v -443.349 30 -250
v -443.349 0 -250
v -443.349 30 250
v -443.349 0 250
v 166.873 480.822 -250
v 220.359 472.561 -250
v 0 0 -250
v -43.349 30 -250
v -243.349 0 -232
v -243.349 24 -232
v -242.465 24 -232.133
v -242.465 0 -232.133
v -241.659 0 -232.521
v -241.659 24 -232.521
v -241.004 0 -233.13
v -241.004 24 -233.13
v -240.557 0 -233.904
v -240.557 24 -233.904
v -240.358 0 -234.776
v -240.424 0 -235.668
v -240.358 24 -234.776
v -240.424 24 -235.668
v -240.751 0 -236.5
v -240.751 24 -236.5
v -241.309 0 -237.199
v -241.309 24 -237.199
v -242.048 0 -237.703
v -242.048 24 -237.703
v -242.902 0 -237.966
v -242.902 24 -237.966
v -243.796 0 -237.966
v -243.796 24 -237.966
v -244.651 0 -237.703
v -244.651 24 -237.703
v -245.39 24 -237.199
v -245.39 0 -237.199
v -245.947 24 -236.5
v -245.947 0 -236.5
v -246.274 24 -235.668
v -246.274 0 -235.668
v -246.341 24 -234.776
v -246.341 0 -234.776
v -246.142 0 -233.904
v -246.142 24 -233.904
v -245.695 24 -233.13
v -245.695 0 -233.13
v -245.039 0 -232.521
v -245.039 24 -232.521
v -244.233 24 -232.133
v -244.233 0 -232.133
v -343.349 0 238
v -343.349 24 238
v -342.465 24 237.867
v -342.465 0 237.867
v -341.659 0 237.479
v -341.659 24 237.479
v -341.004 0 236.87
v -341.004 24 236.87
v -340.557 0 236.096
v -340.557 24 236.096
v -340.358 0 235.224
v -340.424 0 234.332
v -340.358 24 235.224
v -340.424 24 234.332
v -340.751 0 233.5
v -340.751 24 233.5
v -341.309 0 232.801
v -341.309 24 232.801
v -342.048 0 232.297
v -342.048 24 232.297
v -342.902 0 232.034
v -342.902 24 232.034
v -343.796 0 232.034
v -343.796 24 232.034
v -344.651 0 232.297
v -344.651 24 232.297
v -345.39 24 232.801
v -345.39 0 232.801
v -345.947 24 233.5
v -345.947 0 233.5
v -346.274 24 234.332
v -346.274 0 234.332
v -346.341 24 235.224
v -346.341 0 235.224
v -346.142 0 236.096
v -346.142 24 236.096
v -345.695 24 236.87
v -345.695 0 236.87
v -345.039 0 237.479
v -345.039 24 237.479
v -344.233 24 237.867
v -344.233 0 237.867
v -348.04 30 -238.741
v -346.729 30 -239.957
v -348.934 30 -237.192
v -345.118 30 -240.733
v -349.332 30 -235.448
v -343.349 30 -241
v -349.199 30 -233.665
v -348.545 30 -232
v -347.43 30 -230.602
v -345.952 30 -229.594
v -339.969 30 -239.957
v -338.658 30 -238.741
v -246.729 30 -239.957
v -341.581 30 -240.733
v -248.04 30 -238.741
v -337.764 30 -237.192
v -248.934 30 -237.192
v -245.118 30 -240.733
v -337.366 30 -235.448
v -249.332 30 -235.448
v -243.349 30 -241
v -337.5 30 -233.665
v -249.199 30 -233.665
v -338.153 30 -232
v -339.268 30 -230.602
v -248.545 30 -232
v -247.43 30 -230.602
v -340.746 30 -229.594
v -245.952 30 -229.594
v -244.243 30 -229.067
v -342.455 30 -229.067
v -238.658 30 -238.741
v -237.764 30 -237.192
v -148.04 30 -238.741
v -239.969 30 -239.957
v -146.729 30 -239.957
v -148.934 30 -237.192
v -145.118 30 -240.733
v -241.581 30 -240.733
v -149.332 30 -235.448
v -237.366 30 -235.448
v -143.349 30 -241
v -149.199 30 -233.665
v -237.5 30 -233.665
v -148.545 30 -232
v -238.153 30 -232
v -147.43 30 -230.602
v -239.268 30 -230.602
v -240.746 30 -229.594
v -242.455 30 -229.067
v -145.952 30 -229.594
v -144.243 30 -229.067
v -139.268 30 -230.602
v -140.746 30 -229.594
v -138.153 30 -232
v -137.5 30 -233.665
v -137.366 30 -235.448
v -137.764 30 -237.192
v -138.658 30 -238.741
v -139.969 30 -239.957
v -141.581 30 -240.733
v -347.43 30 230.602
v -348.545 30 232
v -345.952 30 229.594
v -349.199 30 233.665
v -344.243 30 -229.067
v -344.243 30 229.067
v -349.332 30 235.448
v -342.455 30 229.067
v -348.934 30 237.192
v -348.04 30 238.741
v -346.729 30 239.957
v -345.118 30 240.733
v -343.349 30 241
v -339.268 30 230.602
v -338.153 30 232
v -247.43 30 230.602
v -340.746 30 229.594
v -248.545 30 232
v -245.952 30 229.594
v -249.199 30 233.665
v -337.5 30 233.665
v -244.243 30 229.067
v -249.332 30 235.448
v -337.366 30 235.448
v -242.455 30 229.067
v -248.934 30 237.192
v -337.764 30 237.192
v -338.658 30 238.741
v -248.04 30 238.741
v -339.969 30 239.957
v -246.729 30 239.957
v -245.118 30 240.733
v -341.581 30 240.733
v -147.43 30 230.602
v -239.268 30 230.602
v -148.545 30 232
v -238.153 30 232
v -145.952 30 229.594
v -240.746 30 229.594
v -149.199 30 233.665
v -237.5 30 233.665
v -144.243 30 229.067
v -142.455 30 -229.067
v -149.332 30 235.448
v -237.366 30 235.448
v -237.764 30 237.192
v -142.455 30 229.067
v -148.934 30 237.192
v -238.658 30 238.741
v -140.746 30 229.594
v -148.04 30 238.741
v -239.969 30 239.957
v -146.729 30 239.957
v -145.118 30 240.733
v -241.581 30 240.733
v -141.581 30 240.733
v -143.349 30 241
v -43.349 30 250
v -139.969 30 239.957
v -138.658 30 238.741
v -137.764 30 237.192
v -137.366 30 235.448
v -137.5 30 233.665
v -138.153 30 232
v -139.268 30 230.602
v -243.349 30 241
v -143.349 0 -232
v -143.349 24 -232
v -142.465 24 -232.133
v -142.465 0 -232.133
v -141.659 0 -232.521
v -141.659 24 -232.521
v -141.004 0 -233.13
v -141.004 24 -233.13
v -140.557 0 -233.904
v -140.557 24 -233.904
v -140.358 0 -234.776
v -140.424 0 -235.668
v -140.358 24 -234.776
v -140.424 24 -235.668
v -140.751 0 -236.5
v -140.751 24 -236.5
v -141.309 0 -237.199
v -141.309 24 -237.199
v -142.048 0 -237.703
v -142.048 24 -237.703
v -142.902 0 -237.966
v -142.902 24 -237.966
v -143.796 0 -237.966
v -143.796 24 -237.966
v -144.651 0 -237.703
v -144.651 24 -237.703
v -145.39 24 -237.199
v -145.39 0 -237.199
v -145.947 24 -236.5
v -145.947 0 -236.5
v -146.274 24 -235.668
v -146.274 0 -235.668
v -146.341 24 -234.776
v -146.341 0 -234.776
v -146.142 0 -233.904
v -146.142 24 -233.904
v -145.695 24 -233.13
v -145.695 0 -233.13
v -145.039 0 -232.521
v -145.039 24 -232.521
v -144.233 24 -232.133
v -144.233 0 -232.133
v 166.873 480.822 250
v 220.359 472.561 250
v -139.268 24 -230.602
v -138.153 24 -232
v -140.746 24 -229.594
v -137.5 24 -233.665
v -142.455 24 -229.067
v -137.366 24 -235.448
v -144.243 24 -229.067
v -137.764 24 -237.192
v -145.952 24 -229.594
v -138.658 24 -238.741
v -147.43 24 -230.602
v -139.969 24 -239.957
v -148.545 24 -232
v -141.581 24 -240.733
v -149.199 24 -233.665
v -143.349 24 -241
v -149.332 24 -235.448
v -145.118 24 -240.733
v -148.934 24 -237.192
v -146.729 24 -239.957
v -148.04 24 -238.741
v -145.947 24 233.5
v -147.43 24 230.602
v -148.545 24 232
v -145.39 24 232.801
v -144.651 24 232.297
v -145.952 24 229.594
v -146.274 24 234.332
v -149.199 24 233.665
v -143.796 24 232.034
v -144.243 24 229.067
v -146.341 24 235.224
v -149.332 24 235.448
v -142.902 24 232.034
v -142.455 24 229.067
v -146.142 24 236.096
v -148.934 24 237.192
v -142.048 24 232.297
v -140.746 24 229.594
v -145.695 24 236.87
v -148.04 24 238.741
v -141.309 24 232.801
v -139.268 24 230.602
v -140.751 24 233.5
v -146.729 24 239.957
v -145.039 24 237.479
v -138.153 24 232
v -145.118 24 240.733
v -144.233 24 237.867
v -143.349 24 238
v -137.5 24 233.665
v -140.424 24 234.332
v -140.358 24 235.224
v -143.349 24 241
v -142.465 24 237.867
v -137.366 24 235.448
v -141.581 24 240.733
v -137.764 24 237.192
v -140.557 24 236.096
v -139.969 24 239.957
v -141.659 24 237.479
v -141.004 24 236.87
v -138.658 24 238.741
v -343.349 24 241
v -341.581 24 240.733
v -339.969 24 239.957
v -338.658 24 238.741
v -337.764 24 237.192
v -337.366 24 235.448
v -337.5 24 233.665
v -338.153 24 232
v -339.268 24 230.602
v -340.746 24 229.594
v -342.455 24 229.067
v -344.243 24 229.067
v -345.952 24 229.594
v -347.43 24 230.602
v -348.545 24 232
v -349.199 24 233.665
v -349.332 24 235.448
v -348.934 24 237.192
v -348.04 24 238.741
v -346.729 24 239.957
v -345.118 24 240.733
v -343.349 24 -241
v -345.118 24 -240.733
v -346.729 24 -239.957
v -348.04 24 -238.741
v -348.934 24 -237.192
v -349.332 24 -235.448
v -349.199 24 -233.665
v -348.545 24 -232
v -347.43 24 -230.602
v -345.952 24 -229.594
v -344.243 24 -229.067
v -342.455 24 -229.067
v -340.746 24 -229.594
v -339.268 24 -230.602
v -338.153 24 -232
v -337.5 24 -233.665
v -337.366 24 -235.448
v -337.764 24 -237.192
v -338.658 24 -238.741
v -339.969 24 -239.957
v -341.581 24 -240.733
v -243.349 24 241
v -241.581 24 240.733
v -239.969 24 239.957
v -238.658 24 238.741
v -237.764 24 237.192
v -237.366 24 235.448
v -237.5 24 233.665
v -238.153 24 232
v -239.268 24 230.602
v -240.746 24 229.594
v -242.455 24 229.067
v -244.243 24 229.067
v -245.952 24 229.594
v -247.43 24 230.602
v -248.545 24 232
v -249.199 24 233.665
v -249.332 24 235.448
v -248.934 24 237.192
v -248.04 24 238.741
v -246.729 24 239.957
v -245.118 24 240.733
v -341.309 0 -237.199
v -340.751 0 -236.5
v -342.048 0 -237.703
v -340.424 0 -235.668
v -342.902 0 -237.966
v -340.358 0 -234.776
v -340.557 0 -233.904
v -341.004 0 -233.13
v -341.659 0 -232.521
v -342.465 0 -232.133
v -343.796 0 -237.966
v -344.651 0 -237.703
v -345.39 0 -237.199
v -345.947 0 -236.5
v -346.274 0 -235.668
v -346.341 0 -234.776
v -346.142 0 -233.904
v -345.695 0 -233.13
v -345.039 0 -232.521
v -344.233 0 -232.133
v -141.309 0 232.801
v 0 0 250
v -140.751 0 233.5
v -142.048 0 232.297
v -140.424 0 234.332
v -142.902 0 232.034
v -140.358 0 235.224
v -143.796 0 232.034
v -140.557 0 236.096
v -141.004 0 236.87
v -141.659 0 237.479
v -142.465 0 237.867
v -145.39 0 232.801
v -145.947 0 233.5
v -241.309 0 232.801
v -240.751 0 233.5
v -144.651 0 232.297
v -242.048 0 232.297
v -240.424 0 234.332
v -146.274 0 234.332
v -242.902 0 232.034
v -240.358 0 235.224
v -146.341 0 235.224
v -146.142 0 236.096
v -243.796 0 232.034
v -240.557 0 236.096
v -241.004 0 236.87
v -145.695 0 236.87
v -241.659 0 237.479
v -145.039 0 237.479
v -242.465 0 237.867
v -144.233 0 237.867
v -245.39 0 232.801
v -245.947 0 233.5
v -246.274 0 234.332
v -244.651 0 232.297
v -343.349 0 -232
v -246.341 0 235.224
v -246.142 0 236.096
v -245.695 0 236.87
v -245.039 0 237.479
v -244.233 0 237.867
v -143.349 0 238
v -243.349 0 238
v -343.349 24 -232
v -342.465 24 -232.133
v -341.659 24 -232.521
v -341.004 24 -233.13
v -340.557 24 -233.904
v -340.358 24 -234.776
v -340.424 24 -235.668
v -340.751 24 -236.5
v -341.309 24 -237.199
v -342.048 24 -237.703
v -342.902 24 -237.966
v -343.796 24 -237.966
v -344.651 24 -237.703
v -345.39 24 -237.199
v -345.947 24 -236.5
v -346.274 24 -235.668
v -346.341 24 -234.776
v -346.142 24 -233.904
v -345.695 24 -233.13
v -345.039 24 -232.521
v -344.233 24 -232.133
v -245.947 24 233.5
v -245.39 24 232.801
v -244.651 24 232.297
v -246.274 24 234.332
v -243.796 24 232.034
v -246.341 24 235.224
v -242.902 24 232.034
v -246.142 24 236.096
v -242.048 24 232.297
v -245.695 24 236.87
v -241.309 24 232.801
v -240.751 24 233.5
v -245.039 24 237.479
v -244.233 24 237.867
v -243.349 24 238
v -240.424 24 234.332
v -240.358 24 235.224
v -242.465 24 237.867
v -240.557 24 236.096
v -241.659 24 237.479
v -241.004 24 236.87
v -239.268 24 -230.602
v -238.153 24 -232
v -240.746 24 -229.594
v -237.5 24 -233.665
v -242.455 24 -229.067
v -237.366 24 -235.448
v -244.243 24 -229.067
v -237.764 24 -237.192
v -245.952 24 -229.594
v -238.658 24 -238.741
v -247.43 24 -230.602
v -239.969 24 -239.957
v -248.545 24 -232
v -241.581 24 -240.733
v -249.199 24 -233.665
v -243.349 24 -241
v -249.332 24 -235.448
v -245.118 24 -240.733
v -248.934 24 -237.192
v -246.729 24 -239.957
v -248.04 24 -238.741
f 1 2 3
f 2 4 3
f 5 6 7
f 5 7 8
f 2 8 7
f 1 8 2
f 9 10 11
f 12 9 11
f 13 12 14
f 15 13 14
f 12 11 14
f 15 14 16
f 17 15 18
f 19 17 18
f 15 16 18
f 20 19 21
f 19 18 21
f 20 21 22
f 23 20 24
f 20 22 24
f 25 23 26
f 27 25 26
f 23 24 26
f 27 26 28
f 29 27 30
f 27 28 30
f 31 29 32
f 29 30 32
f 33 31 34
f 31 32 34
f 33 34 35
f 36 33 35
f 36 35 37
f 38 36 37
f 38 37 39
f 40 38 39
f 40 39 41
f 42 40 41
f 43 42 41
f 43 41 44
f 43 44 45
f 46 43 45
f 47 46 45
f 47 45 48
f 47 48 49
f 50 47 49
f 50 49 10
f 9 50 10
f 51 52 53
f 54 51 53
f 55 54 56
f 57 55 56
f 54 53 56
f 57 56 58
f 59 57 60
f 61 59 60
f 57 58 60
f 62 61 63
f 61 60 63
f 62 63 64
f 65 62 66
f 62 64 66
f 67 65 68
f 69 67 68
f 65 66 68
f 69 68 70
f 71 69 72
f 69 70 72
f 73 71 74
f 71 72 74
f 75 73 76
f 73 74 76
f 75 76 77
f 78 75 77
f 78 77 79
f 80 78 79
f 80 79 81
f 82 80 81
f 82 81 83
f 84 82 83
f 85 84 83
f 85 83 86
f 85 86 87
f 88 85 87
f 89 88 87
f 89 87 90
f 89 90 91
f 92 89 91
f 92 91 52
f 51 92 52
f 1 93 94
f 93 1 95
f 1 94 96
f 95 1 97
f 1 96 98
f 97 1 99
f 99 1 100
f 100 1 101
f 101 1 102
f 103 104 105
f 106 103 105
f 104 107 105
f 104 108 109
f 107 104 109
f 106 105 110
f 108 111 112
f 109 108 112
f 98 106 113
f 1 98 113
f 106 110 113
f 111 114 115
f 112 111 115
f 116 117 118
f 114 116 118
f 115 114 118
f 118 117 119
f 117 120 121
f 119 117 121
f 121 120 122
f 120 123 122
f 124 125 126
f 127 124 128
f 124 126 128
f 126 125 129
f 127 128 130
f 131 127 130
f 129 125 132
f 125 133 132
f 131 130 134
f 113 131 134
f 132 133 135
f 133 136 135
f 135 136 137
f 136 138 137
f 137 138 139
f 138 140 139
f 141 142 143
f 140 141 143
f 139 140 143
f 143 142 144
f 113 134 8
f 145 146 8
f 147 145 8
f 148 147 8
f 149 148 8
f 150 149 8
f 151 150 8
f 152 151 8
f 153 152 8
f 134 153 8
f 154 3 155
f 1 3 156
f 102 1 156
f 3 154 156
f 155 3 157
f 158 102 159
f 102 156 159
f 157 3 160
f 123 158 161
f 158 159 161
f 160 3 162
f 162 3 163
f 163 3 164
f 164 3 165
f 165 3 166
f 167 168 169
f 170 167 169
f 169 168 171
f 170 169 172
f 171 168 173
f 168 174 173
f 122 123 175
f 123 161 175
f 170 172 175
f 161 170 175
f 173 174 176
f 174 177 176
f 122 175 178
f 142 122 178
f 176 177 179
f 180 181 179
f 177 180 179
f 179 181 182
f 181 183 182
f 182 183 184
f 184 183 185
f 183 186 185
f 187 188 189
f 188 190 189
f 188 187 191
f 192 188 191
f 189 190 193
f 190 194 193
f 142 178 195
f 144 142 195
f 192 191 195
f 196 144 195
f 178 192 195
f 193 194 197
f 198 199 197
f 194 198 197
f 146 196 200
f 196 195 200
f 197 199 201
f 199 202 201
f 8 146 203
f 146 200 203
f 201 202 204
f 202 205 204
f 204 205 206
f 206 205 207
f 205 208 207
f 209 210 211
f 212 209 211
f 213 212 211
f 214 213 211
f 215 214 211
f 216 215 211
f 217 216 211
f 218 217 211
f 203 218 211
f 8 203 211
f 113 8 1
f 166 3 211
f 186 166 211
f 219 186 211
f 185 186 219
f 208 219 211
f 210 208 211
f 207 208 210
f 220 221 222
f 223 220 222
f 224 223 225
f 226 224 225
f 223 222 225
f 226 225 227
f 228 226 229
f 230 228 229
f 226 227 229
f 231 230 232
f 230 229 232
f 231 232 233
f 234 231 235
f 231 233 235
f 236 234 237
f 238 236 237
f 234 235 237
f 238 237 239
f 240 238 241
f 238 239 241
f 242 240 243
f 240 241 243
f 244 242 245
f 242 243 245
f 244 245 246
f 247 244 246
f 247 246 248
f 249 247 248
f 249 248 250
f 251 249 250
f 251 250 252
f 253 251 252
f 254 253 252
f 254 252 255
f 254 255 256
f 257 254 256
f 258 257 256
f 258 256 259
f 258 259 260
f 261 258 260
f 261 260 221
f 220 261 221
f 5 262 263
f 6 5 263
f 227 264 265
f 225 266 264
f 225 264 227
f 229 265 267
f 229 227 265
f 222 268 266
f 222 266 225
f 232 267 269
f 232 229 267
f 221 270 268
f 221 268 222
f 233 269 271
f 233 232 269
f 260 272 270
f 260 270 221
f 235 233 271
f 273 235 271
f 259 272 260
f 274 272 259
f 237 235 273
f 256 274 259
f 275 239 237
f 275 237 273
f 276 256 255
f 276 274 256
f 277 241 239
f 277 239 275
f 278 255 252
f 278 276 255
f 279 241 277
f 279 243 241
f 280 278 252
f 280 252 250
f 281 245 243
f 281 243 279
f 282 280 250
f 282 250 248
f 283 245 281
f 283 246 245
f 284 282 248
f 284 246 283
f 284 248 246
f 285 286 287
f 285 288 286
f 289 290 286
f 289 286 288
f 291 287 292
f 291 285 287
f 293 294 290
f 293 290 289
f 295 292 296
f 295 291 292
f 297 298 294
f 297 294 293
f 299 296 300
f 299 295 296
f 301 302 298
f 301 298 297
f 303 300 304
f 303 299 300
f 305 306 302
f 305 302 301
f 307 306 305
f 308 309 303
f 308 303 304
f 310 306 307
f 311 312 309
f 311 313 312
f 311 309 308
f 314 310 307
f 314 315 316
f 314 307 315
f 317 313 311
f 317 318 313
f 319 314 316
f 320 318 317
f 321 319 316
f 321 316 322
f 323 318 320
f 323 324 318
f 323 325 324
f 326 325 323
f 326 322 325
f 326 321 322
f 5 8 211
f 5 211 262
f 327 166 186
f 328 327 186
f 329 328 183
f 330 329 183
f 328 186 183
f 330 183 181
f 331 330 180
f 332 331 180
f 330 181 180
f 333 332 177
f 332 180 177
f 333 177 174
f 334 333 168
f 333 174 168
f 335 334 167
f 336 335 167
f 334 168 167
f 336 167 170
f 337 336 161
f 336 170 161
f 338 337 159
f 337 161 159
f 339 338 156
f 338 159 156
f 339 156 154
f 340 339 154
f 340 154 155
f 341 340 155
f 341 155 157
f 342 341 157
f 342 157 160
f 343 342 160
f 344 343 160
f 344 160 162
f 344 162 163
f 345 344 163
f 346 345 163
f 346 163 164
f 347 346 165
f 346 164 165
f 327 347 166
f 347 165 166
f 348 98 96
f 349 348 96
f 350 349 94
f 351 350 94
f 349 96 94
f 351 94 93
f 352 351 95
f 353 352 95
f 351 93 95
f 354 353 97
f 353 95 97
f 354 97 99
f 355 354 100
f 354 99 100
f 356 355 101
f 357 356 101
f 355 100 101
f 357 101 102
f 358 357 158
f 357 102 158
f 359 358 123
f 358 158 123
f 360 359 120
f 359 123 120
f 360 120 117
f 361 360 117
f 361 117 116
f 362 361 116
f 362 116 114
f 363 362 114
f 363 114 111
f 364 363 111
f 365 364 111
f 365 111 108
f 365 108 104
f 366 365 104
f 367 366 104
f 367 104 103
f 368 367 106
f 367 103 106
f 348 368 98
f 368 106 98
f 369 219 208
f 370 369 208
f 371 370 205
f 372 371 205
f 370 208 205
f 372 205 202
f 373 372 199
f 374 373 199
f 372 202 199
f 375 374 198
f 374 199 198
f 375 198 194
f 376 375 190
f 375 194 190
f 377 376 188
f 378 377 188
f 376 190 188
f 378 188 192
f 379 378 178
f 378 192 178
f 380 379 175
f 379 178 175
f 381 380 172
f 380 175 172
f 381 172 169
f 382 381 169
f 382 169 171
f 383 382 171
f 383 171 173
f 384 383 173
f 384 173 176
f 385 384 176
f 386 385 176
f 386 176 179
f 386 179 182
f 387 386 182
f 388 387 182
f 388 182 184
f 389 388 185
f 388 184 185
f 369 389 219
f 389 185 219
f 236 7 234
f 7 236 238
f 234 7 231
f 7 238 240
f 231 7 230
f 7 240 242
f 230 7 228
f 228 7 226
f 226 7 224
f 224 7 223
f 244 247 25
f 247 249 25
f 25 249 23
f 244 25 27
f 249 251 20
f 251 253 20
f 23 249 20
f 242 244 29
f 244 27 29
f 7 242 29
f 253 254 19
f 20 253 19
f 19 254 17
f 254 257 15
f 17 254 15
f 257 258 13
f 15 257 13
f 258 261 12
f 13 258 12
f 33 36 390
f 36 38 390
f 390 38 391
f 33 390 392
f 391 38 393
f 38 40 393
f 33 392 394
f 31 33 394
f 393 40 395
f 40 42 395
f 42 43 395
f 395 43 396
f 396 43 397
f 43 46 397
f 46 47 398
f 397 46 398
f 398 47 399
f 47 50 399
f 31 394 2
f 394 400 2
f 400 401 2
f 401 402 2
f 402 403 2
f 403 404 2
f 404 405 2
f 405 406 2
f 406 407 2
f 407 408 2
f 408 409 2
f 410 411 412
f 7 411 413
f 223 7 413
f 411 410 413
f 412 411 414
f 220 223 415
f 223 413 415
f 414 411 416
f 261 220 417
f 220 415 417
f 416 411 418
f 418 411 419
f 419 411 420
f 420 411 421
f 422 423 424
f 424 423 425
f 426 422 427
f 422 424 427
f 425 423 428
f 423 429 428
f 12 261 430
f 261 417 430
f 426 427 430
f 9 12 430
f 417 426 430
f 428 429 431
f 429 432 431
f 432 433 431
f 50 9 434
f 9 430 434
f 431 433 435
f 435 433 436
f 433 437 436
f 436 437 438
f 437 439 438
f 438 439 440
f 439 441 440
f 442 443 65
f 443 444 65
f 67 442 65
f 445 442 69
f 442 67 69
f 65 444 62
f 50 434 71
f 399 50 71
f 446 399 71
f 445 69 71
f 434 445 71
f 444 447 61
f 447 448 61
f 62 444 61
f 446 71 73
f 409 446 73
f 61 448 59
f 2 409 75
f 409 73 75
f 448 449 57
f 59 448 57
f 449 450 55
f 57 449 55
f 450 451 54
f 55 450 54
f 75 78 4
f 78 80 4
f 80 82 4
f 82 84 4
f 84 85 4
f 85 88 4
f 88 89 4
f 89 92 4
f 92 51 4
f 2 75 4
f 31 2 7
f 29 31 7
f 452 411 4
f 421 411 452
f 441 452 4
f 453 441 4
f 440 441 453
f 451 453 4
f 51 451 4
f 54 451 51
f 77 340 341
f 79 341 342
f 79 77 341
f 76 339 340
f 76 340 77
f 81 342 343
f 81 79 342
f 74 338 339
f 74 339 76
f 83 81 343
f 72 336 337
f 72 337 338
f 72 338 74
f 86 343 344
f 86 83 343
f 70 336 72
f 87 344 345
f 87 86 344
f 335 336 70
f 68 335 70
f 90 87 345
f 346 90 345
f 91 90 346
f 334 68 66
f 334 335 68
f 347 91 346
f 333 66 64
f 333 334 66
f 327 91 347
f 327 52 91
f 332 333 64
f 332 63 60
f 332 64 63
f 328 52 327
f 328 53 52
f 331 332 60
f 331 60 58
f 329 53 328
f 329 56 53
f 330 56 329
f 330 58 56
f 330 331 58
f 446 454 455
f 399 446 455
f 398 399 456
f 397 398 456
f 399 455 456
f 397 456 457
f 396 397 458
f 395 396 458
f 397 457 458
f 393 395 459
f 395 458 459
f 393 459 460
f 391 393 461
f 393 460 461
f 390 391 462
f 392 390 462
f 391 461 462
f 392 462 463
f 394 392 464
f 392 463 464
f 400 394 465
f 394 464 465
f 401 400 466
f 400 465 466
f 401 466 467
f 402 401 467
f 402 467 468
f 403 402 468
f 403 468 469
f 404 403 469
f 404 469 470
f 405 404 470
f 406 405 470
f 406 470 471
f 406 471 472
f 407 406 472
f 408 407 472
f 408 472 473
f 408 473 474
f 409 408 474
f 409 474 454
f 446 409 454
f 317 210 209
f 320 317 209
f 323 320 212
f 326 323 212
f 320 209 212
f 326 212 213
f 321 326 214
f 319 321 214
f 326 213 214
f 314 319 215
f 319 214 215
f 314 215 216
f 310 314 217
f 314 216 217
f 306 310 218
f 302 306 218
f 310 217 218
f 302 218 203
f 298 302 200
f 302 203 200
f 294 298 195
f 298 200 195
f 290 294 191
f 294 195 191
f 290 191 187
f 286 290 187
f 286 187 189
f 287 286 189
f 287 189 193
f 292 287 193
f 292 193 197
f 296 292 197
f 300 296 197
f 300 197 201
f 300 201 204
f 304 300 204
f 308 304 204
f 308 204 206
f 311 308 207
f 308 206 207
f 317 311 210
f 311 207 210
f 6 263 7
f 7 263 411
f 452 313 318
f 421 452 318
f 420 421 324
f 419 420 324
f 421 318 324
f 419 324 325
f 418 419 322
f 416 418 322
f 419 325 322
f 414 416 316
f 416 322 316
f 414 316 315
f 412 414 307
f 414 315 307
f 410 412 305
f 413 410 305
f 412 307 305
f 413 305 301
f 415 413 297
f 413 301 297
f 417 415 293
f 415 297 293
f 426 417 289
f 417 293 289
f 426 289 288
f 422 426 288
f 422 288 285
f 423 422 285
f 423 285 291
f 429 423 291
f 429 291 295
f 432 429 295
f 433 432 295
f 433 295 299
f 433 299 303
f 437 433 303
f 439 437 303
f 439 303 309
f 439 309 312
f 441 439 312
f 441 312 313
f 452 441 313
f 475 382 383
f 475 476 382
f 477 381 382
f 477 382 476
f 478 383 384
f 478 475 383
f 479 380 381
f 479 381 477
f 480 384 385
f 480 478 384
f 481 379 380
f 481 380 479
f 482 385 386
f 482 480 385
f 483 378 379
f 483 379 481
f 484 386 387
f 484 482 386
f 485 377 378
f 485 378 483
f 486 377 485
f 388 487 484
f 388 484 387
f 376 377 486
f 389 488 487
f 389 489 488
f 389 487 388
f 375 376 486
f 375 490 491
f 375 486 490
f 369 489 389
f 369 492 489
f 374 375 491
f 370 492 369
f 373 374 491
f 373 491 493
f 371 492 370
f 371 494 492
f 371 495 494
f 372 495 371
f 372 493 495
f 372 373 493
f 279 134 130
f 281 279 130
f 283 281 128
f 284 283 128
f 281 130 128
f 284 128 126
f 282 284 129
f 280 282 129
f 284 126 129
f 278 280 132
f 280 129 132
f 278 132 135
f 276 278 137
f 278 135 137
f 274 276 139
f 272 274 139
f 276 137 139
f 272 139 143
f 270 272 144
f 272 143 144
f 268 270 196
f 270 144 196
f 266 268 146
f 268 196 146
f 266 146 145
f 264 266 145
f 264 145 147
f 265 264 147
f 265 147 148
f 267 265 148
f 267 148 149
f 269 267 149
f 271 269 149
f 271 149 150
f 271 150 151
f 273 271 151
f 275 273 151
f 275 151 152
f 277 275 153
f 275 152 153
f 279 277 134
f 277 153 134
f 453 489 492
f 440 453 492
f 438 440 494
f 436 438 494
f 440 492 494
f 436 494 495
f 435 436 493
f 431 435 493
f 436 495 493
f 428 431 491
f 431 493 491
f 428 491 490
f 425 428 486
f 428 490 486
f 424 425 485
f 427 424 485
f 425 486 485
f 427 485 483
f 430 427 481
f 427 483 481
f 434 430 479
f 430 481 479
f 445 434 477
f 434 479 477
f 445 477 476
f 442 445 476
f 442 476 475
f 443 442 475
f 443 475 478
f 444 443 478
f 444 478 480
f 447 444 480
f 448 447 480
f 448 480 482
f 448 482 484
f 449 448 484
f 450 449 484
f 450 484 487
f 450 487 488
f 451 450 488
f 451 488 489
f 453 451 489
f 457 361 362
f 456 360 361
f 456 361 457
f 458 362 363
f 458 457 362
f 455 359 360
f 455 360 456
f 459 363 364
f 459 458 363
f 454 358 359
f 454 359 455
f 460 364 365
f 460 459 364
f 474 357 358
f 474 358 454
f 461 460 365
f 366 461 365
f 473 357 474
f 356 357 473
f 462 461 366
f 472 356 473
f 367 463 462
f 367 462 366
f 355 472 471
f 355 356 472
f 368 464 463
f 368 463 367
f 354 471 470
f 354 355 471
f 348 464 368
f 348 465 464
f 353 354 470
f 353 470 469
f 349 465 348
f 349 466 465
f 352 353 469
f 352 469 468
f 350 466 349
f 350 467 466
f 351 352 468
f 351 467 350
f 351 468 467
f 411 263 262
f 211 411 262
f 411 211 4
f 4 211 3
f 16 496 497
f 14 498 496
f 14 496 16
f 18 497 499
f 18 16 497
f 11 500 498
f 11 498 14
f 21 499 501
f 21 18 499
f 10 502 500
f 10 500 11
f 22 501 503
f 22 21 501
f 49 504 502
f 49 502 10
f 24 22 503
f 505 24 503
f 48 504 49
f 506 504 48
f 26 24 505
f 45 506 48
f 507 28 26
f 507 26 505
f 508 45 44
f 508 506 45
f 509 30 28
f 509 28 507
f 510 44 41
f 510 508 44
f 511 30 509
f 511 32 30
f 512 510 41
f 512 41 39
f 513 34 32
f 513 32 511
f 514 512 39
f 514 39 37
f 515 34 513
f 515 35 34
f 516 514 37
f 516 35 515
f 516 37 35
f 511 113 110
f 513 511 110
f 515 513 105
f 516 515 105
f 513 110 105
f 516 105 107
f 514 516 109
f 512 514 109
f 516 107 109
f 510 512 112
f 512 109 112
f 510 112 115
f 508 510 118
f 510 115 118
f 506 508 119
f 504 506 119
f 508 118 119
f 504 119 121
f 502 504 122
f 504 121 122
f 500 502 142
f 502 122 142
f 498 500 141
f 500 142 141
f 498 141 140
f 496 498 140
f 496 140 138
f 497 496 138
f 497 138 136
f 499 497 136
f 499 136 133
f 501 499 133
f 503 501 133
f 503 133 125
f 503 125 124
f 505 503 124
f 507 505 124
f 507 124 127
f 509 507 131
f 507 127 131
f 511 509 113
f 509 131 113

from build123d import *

# Parameters (mm, degrees)
BOSS_EXTRUDE2_DEPTH = 250
SKETCH5_R           = 6
CUT_EXTRUDE1_DEPTH  = 6
SKETCH6_R           = 3
CUT_EXTRUDE2_DEPTH  = 684.91866463


with BuildPart() as part:
    # Sketch2 → Boss-Extrude2 (new, symmetric)
    with BuildSketch(Plane.XY):
        Polygon((0, 0), (-443.349160121, 0), (-443.349160121, 30), (-43.349160121, 30), (166.872551321, 480.821915028), (220.358608676, 472.5605613), align=None)
    extrude(amount=BOSS_EXTRUDE2_DEPTH, both=True)

    # Sketch5 → Cut-Extrude1 (cut)
    with BuildSketch(Plane(origin=(0, 30, 0), x_dir=(1, 0, 0), z_dir=(0, 1, 0))):
        with Locations(Location((-343.349160121, -235, 0), (0, 0, 270))):
            Circle(SKETCH5_R)
        with Locations(Location((-243.349160121, -235, 0), (0, 0, 270))):
            Circle(SKETCH5_R)
        with Locations(Location((-143.349160121, -235, 0), (0, 0, 270))):
            Circle(SKETCH5_R)
        with Locations(Location((-143.349160121, 235, 0), (0, 0, 90))):
            Circle(SKETCH5_R)
        with Locations(Location((-243.349160121, 235, 0), (0, 0, 90))):
            Circle(SKETCH5_R)
        with Locations(Location((-343.349160121, 235, 0), (0, 0, 90))):
            Circle(SKETCH5_R)
    extrude(amount=-CUT_EXTRUDE1_DEPTH, mode=Mode.SUBTRACT)

    # Sketch6 → Cut-Extrude2 (cut, through all)
    with BuildSketch(Plane(origin=(0, 24, 0), x_dir=(1, 0, 0), z_dir=(0, 1, 0))):
        with Locations(Location((-143.349160121, 235, 0), (0, 0, 270))):
            Circle(SKETCH6_R)
        with Locations(Location((-243.349160121, 235, 0), (0, 0, 270))):
            Circle(SKETCH6_R)
        with Locations(Location((-343.349160121, 235, 0), (0, 0, 270))):
            Circle(SKETCH6_R)
        with Locations(Location((-343.349160121, -235, 0), (0, 0, 270))):
            Circle(SKETCH6_R)
        with Locations(Location((-243.349160121, -235, 0), (0, 0, 270))):
            Circle(SKETCH6_R)
        with Locations(Location((-143.349160121, -235, 0), (0, 0, 270))):
            Circle(SKETCH6_R)
    extrude(amount=-CUT_EXTRUDE2_DEPTH, mode=Mode.SUBTRACT)


solid = part.part
